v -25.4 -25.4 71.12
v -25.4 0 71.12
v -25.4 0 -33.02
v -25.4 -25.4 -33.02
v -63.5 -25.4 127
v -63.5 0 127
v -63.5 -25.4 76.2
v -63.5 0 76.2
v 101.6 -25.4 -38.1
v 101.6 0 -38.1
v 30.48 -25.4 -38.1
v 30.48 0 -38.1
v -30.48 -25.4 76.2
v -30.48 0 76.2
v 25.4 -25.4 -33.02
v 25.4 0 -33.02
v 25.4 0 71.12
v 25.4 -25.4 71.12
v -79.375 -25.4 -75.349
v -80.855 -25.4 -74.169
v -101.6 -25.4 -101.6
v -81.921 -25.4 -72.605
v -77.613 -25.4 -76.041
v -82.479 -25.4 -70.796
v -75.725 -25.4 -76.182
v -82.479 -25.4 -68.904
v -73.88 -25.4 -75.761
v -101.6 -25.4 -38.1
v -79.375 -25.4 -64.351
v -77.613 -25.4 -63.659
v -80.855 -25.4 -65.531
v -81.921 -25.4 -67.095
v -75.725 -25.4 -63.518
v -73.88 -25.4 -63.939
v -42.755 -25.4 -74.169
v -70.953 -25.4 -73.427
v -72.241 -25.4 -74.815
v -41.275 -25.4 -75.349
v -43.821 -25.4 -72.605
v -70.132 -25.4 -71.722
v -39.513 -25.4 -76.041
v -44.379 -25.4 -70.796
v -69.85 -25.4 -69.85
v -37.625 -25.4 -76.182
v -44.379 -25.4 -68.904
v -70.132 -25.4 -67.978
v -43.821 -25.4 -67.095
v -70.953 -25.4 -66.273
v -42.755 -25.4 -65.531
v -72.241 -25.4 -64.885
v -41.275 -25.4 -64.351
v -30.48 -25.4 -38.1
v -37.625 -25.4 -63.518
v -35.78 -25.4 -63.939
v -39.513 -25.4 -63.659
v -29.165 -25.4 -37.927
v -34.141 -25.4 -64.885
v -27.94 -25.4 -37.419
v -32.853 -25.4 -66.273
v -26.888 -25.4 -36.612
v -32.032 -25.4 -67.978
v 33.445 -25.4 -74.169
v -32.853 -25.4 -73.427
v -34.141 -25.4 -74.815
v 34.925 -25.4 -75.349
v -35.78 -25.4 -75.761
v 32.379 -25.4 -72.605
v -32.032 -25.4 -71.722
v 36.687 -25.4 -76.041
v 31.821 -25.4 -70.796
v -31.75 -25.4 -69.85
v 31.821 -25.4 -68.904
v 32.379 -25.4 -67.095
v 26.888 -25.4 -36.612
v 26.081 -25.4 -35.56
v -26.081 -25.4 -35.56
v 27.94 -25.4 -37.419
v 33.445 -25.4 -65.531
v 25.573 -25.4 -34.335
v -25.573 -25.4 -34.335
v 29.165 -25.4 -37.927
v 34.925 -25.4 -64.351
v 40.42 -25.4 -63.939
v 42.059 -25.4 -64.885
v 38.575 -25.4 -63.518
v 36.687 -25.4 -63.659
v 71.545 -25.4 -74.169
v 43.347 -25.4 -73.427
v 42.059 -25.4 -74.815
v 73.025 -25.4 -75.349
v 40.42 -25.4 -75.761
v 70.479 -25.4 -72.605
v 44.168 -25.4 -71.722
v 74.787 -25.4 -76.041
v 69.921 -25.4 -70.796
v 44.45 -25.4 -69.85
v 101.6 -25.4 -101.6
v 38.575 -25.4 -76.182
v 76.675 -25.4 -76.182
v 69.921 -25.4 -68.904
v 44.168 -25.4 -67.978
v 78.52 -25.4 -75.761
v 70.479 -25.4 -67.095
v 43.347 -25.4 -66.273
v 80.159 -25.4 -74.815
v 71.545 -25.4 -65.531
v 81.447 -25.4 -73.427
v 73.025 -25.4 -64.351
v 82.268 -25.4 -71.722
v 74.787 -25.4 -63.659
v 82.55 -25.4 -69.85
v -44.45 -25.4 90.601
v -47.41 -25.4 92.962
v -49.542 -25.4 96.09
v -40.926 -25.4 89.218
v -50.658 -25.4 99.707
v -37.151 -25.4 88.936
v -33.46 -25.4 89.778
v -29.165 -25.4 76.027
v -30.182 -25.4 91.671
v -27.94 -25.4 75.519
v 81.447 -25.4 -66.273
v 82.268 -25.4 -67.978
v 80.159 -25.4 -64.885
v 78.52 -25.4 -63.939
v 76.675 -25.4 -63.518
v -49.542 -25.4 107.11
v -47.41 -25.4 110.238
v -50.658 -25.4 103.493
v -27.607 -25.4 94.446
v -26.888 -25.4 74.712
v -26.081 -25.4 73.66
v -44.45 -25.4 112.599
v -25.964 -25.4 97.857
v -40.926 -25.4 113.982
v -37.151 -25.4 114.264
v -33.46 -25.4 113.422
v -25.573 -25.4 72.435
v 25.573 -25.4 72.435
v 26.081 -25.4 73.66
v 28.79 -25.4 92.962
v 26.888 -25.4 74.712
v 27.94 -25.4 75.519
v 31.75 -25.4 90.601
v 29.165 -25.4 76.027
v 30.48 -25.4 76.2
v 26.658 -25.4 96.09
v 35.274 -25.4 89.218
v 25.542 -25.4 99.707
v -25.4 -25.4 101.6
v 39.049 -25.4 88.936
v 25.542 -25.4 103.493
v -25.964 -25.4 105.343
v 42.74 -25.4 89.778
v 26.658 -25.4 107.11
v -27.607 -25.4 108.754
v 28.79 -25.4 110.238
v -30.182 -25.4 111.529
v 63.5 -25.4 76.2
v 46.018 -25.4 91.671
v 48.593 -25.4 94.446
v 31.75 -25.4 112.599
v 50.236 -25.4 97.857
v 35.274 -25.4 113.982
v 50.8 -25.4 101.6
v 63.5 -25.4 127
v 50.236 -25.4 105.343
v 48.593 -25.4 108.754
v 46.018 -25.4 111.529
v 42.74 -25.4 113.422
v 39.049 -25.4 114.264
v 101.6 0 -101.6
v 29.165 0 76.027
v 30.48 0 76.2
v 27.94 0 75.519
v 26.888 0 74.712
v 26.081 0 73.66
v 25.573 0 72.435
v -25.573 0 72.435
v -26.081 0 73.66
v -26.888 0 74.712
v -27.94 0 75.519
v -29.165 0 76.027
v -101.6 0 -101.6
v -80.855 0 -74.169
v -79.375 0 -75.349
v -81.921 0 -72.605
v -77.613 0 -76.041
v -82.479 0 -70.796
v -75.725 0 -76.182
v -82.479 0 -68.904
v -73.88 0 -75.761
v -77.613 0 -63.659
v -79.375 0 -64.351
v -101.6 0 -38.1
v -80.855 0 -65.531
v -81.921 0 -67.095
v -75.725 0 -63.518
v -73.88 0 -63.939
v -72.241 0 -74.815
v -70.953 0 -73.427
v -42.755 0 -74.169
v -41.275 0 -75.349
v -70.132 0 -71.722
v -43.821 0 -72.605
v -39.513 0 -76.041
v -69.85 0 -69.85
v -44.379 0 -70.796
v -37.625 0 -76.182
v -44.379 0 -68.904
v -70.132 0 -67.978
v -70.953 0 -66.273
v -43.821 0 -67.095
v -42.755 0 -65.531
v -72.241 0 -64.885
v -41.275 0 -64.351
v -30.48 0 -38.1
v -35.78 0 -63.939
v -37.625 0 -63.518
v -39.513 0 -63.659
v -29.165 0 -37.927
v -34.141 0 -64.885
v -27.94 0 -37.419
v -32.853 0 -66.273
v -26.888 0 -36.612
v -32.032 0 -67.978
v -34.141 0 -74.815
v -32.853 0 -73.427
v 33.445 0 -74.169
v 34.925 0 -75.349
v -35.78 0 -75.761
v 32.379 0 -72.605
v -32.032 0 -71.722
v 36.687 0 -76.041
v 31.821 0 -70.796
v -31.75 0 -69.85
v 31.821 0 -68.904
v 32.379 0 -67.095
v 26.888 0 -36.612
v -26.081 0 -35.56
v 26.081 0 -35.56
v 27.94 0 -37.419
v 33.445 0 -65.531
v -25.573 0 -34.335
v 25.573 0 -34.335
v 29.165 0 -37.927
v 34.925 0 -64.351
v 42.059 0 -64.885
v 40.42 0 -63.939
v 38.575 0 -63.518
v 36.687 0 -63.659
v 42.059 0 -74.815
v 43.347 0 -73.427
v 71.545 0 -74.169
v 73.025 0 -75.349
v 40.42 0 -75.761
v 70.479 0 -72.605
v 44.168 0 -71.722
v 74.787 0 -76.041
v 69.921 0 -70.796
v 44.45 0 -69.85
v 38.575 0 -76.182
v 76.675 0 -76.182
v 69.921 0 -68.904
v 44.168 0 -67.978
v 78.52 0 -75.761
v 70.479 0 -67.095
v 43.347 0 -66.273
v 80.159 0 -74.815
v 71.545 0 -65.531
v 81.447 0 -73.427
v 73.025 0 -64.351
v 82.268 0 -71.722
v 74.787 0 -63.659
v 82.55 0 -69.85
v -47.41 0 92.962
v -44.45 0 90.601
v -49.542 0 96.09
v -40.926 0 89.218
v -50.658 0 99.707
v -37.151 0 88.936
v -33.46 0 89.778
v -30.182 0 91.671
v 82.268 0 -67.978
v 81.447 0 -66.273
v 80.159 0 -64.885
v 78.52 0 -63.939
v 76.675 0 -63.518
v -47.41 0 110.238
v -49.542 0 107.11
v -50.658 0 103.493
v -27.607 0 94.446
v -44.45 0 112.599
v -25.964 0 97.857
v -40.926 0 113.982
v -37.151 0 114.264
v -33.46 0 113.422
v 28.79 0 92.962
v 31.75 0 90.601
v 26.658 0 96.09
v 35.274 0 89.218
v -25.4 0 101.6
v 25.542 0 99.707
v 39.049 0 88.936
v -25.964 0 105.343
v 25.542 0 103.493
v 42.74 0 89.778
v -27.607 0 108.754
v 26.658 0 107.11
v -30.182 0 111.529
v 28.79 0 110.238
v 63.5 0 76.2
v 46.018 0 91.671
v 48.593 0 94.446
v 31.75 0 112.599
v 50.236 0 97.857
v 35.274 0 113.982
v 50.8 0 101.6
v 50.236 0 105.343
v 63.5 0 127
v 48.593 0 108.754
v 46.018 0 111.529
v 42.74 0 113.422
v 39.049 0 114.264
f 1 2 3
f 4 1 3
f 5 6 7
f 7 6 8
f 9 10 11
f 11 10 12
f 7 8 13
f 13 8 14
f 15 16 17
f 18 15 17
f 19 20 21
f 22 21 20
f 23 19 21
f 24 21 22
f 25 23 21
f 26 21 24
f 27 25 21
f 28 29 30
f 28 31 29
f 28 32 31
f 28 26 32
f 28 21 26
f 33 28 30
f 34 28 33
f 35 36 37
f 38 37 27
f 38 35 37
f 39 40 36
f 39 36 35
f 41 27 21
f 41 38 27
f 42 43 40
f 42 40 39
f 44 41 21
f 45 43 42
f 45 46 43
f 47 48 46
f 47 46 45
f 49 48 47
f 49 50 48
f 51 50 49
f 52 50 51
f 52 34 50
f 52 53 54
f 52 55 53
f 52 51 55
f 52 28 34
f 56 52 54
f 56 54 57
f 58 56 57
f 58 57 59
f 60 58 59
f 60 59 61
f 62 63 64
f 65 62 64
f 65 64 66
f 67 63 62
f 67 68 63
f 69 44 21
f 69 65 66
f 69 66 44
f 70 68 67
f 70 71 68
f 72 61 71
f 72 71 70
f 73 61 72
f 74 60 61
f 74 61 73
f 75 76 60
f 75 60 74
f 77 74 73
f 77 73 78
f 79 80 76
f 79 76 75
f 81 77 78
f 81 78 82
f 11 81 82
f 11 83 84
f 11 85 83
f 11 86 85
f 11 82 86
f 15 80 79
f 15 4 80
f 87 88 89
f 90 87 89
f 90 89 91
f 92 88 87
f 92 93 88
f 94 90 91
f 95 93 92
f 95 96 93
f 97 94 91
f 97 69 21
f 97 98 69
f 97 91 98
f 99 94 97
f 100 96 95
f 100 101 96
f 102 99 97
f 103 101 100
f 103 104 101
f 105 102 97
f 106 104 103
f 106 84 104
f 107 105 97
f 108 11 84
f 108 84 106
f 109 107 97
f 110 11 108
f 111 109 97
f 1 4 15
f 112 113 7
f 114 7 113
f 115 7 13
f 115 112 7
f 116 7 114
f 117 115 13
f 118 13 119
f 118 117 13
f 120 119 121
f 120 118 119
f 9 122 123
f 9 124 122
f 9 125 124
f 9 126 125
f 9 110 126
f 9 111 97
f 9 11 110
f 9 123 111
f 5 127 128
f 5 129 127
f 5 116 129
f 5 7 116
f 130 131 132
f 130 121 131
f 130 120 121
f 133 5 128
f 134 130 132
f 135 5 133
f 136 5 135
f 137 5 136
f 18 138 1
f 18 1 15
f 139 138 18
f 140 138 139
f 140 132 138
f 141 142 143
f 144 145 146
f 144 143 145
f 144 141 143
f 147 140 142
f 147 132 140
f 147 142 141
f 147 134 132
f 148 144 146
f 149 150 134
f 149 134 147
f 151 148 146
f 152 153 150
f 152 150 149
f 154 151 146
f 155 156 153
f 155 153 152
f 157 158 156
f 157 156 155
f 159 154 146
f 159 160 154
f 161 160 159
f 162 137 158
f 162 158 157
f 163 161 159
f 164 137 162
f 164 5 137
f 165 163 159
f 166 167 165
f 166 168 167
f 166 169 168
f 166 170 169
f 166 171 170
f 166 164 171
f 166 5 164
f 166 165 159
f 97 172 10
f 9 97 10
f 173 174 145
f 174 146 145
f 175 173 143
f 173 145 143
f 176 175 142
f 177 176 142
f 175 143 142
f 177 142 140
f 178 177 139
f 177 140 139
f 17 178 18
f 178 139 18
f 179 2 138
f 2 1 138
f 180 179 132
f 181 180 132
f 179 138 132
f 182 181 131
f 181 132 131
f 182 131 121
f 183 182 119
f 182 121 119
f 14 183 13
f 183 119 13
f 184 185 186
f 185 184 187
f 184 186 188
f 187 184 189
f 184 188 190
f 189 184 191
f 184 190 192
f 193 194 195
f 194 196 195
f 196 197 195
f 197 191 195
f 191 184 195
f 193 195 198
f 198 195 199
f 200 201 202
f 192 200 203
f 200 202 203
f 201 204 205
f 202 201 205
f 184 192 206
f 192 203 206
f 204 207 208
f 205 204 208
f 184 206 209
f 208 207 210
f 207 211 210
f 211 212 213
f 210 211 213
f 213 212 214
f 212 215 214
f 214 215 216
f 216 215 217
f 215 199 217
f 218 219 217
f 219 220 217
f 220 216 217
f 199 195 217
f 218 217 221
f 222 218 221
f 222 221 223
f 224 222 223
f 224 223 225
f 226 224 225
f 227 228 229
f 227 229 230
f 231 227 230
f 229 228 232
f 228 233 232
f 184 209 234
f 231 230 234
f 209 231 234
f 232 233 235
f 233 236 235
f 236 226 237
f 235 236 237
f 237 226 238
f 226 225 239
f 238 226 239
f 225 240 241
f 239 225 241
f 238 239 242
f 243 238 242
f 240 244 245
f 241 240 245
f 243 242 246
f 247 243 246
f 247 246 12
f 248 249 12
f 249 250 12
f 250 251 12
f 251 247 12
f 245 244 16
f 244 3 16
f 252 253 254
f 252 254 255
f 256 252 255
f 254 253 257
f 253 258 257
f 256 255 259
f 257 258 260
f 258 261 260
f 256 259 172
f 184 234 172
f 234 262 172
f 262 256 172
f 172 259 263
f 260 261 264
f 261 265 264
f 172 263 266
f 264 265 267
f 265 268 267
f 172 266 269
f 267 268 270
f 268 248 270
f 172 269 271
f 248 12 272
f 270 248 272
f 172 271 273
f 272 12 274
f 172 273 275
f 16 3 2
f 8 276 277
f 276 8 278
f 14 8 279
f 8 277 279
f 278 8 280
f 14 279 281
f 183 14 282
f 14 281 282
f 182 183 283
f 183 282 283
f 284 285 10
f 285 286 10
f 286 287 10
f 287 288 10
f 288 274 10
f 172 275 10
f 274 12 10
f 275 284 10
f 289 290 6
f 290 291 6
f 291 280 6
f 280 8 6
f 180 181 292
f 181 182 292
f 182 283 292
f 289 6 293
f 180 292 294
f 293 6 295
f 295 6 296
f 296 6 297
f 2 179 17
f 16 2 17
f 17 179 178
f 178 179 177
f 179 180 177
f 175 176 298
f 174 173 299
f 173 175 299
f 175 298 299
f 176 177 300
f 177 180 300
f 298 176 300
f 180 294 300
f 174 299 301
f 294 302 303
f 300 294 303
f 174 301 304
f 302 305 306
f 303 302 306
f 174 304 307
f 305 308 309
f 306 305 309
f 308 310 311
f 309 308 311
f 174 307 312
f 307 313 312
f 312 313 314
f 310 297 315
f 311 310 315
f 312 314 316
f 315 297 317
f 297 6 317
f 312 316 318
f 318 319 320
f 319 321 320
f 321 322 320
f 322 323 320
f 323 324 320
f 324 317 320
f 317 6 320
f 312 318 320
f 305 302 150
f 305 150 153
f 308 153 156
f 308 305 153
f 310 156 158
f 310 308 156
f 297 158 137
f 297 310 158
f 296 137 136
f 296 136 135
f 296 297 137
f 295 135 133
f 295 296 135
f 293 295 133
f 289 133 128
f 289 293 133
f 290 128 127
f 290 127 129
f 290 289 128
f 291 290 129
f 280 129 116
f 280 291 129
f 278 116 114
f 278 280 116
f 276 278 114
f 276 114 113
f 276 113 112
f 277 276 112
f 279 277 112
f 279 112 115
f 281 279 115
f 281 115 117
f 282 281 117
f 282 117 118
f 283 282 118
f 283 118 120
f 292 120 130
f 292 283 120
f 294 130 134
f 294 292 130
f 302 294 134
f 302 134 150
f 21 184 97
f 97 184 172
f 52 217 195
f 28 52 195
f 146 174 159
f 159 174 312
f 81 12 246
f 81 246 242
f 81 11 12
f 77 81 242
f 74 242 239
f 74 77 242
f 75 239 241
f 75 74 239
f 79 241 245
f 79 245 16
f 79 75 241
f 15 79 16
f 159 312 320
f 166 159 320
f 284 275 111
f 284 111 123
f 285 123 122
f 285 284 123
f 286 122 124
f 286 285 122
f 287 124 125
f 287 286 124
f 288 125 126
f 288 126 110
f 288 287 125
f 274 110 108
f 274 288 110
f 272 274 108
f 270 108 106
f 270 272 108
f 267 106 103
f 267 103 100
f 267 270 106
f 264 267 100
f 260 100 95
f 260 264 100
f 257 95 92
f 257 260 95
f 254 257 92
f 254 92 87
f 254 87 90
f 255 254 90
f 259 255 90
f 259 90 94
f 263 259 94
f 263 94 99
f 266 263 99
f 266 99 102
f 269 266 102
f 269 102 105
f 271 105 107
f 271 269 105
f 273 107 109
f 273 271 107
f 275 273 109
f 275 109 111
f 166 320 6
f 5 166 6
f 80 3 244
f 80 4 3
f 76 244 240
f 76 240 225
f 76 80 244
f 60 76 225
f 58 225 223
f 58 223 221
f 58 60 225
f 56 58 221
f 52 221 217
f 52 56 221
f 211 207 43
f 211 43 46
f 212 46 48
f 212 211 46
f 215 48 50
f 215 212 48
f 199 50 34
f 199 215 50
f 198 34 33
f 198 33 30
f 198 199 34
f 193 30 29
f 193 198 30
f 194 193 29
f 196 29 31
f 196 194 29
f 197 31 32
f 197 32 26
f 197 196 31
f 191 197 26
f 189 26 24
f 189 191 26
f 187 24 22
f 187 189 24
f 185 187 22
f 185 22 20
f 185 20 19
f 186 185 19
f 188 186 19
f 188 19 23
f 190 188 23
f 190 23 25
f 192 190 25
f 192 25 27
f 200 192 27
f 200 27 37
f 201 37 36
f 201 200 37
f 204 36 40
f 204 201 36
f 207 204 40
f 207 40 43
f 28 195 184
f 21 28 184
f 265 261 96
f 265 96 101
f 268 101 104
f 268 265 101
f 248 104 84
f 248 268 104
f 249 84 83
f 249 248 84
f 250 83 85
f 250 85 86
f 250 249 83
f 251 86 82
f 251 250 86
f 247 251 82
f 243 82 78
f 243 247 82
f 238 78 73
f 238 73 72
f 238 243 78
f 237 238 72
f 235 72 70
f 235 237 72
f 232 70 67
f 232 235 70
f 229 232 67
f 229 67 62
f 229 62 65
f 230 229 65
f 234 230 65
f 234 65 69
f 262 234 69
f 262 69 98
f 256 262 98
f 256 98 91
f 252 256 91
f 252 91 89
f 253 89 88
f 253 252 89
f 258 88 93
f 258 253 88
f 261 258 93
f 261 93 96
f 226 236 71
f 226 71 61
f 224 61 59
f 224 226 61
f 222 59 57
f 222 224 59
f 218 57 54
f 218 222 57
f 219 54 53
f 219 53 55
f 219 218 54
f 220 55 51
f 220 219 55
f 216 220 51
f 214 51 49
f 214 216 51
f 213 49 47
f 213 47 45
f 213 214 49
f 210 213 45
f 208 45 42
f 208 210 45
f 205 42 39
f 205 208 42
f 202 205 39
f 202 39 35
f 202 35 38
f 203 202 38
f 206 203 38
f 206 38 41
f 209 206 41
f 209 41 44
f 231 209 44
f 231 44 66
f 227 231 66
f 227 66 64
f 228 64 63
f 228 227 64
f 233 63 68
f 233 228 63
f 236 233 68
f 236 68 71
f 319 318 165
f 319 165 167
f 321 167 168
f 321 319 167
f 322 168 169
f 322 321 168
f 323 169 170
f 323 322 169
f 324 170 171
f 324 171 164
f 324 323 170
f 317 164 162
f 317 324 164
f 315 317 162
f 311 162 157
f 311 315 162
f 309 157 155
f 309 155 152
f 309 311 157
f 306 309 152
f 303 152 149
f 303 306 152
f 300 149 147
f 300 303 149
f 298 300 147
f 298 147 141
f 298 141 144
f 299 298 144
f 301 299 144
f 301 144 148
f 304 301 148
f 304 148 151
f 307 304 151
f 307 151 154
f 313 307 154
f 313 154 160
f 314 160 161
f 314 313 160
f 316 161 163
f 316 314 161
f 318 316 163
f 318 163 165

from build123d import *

# Parameters (mm, degrees)
F0_R     = 12.7
F0_R_2   = 6.35
F1_DEPTH = 25.4
F2_R     = 5.08


with BuildPart() as f1:
    # F0 (on Front) → F1 (new body)
    with BuildSketch(Plane.XZ):
        Polygon((-25.4, 0), (0, 0), (25.4, 0), (25.4, 76.2), (63.5, 76.2), (63.5, 127), (-63.5, 127), (-63.5, 76.2), (-25.4, 76.2), align=None)
        with Locations((-38.1, 101.6)):
            Circle(F0_R, mode=Mode.SUBTRACT)
        with Locations((38.1, 101.6)):
            Circle(F0_R, mode=Mode.SUBTRACT)
        Polygon((25.4, 0), (0, 0), (-25.4, 0), (-25.4, -38.1), (-101.6, -38.1), (-101.6, -101.6), (101.6, -101.6), (101.6, -38.1), (25.4, -38.1), align=None)
        with Locations((-76.2, -69.85)):
            Circle(F0_R_2, mode=Mode.SUBTRACT)
        with Locations((-38.1, -69.85)):
            Circle(F0_R_2, mode=Mode.SUBTRACT)
        with Locations((38.1, -69.85)):
            Circle(F0_R_2, mode=Mode.SUBTRACT)
        with Locations((76.2, -69.85)):
            Circle(F0_R_2, mode=Mode.SUBTRACT)
    extrude(amount=F1_DEPTH)

    # F2
    f2_edges = [f1.edges().sort_by_distance(p)[0] for p in [
        (-25.4, -12.7, 76.2),
        (-25.4, -12.7, -38.1),
        (25.4, -12.7, -38.1),
        (25.4, -12.7, 76.2),
    ]]
    fillet(f2_edges, radius=F2_R)


solid = f1.part
